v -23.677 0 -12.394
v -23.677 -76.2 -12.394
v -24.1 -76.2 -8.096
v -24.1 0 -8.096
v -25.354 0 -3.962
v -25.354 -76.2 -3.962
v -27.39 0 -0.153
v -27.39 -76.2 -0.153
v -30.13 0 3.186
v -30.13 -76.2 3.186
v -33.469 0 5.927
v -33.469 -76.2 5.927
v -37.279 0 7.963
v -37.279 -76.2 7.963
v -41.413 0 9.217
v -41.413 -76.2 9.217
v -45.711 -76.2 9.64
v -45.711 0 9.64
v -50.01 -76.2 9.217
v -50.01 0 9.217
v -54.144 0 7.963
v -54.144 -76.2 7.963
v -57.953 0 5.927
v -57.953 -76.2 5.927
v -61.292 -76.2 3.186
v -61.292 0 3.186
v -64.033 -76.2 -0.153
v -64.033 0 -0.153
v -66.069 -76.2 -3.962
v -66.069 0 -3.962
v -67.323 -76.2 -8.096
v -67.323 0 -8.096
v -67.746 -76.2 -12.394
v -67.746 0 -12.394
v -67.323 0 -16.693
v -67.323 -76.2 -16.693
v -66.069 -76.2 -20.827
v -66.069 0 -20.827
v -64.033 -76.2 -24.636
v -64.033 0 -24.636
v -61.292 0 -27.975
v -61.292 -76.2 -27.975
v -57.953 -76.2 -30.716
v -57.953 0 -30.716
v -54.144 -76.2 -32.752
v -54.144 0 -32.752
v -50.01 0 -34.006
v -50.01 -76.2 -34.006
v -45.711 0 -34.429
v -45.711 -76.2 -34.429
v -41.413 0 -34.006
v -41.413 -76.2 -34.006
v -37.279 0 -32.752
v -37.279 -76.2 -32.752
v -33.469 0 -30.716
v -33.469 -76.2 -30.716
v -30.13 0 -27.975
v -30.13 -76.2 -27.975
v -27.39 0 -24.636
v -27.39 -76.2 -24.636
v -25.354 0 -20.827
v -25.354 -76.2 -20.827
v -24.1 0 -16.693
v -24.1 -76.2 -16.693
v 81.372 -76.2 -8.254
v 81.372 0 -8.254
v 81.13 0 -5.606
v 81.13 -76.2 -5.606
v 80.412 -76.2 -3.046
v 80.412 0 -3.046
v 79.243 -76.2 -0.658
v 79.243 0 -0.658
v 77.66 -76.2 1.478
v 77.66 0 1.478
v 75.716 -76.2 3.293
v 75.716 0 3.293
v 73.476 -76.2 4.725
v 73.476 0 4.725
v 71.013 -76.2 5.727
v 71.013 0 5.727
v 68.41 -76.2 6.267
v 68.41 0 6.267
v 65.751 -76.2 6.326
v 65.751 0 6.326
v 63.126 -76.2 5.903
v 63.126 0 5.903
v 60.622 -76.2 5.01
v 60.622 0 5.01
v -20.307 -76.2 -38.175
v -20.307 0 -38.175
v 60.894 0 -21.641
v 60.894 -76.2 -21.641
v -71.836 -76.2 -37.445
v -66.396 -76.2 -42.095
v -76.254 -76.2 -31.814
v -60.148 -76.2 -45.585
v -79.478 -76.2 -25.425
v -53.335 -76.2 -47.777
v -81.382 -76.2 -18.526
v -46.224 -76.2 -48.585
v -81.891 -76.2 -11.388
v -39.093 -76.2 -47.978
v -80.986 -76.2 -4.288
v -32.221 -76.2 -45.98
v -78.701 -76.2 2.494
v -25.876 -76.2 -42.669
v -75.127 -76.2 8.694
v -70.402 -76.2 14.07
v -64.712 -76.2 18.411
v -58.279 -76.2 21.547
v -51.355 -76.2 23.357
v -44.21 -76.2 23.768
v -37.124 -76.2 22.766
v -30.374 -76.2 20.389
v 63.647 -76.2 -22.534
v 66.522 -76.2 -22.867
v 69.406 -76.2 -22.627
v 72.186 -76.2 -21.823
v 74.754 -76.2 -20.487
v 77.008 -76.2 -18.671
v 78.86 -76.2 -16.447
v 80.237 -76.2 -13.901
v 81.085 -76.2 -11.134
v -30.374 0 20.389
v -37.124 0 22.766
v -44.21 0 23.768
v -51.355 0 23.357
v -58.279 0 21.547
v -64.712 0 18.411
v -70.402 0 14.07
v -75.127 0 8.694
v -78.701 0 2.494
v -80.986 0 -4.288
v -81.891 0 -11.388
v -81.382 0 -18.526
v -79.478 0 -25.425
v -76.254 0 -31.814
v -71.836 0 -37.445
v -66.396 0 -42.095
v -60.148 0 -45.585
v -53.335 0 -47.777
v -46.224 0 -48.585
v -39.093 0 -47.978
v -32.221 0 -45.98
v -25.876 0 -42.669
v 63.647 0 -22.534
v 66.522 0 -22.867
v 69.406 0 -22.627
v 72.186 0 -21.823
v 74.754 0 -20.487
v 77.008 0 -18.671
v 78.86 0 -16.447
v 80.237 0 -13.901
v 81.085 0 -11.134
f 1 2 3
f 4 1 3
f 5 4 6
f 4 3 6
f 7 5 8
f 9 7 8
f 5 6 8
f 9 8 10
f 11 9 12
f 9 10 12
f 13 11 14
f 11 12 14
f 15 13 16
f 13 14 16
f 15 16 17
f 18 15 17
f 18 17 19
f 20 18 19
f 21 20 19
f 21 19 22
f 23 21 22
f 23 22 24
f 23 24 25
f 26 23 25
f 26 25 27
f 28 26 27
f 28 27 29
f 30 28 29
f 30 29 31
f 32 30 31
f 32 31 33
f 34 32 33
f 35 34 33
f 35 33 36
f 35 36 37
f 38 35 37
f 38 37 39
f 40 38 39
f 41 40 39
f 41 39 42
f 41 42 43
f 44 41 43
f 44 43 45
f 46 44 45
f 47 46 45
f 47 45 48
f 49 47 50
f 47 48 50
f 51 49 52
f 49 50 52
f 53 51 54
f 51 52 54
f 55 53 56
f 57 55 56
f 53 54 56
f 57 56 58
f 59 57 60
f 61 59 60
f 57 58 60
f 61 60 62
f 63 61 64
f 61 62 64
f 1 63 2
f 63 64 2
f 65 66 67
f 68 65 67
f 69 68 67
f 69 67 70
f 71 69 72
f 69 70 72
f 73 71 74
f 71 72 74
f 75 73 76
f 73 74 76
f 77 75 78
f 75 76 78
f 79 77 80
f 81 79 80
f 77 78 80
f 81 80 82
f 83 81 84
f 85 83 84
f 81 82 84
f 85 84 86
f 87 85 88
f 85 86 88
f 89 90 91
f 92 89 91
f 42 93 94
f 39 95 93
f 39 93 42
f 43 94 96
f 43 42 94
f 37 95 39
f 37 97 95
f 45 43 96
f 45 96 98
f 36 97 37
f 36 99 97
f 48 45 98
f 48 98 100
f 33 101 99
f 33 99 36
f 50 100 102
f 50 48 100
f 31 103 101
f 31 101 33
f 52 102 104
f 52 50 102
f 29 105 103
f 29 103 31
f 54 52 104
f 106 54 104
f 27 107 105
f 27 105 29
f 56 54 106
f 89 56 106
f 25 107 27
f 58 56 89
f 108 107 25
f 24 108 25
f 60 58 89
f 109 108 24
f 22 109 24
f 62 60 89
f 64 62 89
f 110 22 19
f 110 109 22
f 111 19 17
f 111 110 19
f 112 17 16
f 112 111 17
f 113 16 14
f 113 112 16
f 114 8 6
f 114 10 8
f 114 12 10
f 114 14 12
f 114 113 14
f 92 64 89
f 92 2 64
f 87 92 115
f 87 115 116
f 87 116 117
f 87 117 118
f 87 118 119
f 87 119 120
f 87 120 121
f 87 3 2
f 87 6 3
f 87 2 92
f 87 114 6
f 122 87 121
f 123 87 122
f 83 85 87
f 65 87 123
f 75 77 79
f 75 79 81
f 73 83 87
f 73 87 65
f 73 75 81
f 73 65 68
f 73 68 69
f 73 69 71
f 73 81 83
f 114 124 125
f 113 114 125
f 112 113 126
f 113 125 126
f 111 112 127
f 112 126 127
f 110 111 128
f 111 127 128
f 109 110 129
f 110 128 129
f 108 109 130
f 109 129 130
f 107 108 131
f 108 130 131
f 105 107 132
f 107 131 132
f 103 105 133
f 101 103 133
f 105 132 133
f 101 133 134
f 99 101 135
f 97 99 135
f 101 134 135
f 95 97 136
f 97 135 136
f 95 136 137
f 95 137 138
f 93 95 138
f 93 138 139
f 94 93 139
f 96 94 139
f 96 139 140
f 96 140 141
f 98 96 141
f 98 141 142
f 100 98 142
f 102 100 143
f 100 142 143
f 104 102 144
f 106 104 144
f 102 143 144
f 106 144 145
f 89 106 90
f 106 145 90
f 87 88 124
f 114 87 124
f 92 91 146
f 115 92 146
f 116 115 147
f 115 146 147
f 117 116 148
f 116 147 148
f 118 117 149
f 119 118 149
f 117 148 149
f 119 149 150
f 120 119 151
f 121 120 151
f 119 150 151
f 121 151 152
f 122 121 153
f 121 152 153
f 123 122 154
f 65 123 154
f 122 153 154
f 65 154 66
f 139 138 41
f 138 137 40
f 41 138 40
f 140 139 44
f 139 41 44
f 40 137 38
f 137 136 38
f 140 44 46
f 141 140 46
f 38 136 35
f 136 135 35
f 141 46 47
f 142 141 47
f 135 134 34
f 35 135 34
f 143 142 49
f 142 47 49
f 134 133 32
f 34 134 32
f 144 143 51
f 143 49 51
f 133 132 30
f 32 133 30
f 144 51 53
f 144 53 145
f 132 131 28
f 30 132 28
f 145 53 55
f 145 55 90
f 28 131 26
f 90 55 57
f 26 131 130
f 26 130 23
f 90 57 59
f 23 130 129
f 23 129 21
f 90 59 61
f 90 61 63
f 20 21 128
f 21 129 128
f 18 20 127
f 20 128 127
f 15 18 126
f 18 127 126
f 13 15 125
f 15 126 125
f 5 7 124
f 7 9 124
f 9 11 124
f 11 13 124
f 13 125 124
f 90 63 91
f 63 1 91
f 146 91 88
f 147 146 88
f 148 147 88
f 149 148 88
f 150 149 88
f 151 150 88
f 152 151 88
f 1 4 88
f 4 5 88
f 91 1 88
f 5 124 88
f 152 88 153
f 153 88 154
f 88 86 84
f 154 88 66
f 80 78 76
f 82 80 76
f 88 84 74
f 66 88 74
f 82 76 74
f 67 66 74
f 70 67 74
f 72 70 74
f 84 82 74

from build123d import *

# Parameters (mm, degrees)
F1_DEPTH = 76.2
F2_R     = 22.034775
F3_DEPTH = 254


with BuildPart() as f1:
    # F0 (on Front) → F1 (new body)
    with BuildSketch(Plane.XZ):
        with BuildLine():
            ThreePointArc((-20.306642, -38.174558), (-12.323362, -26.367866), (-9.517229, -12.394451))
            ThreePointArc((-9.517229, -12.394451), (-15.17324, 7.033301), (-30.373554, 20.389141))
            ThreePointArc((-30.373554, 20.389141), (-81.382177, -18.526161), (-20.306642, -38.174558))
        make_face()
        with BuildLine():
            ThreePointArc((-30.373554, 20.389141), (-15.17324, 7.033301), (-9.517229, -12.394451))
            ThreePointArc((-9.517229, -12.394451), (-12.323362, -26.367866), (-20.306642, -38.174558))
            Line((-20.306642, -38.174558), (60.893647, -21.640796))
            ThreePointArc((60.893647, -21.640796), (52.14333, -8.403082), (60.621694, 5.010437))
            Line((60.621694, 5.010437), (-30.373554, 20.389141))
        make_face()
        with BuildLine():
            ThreePointArc((81.371971, -8.253959), (74.628734, 4.059837), (60.621694, 5.010437))
            ThreePointArc((60.621694, 5.010437), (52.14333, -8.403082), (60.893647, -21.640796))
            ThreePointArc((60.893647, -21.640796), (74.753969, -20.486795), (81.371971, -8.253959))
        make_face()
    extrude(amount=F1_DEPTH)

    # F2 (on face) → F3 (cut)
    with BuildSketch(Plane.XZ.offset(76.2)):
        with Locations((-45.71129, -12.394451)):
            Circle(F2_R)
    extrude(amount=-F3_DEPTH, mode=Mode.SUBTRACT)


solid = f1.part
